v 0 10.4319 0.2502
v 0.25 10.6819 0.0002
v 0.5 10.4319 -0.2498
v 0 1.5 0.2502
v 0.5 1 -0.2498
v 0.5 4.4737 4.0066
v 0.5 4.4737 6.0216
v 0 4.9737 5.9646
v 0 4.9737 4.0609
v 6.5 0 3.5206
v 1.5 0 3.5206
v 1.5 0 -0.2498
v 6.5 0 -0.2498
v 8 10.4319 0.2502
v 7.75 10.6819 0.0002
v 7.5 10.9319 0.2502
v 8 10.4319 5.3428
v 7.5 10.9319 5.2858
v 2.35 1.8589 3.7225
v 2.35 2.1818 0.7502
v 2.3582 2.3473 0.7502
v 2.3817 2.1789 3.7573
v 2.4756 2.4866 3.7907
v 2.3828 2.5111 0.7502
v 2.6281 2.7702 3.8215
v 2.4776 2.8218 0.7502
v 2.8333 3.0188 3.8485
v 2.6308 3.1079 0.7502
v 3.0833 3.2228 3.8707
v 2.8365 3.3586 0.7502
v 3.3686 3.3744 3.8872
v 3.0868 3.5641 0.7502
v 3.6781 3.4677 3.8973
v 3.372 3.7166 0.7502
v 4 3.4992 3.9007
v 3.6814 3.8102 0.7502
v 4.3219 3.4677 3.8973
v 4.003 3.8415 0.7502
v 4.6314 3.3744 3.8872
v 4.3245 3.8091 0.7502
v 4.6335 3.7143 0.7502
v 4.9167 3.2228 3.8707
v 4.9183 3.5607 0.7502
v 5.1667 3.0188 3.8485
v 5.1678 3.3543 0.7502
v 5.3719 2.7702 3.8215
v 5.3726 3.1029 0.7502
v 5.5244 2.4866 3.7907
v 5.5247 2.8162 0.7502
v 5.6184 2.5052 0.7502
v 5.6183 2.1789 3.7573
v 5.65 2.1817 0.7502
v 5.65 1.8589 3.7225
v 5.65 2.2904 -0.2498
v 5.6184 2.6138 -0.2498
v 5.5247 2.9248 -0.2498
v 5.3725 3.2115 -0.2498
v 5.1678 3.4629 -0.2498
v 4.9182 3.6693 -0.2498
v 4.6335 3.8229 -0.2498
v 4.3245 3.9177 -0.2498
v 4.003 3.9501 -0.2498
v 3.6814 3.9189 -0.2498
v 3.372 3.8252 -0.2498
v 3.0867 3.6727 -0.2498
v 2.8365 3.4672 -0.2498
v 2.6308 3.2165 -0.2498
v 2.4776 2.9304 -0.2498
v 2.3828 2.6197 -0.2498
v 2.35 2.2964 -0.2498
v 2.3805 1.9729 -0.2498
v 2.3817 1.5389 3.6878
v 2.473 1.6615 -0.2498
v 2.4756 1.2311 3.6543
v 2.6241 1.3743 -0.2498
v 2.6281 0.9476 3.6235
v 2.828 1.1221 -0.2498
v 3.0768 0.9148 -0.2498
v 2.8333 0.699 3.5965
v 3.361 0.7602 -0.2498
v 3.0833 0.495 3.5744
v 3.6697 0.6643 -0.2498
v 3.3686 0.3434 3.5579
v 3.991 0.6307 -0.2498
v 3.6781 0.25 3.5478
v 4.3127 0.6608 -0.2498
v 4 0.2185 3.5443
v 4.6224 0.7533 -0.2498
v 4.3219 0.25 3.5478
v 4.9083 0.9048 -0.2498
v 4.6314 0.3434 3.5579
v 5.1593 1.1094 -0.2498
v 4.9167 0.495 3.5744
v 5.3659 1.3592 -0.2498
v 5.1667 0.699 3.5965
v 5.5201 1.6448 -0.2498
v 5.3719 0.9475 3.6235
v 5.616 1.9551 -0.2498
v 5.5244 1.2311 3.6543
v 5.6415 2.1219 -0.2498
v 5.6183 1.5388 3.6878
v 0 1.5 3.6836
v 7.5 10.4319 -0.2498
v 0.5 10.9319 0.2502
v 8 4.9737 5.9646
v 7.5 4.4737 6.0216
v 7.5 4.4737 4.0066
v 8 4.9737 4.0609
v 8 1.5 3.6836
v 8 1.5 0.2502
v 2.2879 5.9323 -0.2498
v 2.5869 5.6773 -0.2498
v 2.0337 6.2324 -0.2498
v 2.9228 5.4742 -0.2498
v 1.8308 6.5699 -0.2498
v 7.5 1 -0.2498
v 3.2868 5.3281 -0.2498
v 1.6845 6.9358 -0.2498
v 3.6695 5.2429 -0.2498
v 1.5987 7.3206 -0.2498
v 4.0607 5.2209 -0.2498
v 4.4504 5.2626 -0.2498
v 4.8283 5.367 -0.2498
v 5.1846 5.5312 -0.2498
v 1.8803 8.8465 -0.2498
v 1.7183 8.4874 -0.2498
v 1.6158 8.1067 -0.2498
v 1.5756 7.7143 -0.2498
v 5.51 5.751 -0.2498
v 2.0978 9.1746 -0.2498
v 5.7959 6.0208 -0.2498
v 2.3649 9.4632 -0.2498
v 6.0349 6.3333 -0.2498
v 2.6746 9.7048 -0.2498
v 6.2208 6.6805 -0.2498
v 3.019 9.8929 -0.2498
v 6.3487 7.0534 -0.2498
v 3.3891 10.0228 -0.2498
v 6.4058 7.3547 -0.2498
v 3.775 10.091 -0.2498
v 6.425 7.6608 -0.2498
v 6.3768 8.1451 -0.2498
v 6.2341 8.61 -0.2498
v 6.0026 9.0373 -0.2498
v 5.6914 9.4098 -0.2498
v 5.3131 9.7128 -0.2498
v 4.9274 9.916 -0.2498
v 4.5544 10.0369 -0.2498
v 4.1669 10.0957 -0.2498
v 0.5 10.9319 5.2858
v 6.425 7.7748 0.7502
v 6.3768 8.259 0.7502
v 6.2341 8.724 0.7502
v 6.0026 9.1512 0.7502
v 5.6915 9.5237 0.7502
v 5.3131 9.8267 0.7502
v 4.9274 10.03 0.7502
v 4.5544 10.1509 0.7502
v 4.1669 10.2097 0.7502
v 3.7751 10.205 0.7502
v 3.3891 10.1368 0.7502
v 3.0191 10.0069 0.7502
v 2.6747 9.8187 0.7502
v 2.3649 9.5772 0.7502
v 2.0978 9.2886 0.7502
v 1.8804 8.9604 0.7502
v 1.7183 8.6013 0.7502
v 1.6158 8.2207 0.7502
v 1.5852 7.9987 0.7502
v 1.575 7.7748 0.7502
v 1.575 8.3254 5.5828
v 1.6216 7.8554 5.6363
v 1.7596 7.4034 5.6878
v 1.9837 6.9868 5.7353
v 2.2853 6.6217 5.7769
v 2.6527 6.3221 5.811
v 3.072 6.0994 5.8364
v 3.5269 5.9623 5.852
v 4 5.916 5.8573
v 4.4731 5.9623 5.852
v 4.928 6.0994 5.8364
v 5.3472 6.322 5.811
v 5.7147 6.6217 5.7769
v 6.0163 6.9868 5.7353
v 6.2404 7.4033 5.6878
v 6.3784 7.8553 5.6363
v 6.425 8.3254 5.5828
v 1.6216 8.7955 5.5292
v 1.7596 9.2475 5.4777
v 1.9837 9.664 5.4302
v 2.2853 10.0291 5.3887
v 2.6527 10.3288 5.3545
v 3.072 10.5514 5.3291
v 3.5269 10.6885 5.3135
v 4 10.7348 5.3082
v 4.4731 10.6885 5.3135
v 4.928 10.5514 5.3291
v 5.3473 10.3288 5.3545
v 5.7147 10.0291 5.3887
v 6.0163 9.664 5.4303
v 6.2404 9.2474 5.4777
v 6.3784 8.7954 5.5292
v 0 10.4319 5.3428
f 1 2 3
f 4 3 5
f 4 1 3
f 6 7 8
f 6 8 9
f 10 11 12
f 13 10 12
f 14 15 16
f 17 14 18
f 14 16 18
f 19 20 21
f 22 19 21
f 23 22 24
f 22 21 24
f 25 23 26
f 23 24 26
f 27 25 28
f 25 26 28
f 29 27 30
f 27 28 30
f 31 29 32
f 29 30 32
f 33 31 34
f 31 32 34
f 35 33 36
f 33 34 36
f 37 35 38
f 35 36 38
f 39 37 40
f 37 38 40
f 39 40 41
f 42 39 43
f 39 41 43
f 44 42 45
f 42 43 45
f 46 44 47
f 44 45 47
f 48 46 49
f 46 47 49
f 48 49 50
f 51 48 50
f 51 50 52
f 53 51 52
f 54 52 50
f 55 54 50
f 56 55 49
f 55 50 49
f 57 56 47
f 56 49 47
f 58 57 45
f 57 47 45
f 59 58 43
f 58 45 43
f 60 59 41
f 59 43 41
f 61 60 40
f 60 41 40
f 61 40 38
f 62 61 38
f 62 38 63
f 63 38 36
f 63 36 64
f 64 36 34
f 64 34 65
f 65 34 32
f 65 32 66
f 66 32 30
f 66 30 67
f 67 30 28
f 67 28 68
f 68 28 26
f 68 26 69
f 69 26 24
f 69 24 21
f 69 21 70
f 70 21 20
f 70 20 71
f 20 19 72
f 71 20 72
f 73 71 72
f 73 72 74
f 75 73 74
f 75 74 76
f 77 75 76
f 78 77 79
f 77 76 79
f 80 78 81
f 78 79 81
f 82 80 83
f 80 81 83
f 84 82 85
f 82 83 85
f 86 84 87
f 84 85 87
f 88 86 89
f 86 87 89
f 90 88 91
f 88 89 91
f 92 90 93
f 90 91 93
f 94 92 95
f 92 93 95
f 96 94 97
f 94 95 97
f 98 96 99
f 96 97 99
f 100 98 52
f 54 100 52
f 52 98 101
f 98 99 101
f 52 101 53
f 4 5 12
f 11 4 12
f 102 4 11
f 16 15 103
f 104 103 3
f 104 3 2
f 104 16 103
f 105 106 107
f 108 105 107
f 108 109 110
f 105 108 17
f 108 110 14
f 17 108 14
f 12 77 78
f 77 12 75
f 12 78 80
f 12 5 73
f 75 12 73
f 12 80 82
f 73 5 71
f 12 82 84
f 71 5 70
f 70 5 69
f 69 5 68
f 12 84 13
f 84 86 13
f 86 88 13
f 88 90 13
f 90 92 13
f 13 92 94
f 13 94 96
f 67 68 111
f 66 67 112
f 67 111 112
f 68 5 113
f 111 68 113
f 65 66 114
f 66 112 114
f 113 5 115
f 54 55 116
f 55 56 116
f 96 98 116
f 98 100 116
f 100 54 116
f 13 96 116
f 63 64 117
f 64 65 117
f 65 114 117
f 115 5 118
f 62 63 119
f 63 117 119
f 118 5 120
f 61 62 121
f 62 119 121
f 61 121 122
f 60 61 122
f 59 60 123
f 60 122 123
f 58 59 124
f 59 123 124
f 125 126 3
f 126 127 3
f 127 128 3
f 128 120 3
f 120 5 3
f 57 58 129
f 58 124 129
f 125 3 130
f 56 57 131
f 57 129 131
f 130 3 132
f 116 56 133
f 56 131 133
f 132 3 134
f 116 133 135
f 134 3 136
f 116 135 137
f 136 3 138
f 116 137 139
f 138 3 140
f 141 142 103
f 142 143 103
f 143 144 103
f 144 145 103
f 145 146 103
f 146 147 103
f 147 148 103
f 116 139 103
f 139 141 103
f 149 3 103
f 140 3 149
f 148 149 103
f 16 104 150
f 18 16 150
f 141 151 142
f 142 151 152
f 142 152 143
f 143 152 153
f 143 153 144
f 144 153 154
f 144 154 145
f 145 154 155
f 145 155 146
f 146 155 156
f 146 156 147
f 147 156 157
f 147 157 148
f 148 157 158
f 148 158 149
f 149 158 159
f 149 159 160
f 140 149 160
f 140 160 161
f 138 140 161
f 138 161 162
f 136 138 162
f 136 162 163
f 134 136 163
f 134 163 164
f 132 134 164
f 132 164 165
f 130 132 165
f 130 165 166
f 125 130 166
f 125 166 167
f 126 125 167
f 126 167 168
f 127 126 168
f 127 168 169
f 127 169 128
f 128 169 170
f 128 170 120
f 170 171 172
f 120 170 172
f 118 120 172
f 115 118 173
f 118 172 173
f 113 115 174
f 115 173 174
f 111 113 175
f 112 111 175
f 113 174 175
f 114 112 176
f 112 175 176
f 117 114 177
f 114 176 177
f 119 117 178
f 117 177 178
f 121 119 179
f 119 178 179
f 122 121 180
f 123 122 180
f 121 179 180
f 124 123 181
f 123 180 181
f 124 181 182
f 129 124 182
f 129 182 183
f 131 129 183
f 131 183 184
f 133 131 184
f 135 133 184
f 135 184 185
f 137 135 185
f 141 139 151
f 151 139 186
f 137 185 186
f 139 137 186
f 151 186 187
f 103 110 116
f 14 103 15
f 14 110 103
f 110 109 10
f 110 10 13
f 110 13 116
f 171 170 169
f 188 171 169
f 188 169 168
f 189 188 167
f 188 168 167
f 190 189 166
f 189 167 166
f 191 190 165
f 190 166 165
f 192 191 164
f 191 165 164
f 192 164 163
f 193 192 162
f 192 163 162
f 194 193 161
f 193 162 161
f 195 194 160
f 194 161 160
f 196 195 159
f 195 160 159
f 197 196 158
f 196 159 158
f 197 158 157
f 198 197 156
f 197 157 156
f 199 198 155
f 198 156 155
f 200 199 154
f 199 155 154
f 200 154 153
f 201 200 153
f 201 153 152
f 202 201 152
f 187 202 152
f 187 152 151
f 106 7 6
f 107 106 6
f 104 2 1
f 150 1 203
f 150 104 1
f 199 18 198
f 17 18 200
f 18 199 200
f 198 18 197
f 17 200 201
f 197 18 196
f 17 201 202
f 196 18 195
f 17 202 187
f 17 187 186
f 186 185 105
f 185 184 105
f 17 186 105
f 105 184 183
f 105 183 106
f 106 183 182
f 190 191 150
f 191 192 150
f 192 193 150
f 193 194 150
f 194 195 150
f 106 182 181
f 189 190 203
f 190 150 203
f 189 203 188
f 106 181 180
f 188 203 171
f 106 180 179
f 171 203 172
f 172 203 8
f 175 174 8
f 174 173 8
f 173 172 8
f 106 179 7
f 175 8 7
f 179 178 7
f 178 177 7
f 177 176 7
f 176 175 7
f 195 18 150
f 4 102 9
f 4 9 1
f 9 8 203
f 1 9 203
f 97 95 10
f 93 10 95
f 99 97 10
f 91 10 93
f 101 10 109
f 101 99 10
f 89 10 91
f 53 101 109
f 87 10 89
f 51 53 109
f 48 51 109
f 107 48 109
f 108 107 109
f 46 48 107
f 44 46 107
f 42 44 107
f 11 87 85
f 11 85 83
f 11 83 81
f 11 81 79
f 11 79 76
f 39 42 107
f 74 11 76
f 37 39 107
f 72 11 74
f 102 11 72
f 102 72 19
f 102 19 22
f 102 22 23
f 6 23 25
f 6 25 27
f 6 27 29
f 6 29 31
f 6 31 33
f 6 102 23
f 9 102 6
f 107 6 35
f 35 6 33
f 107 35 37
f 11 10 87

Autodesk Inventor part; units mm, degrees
ref_plane "YZ Plane" through (0, 0, 0) normal (1, 0, 0) x (0, 1, 0)
ref_plane "XZ Plane" through (0, 0, 0) normal (0, 1, 0) x (-1, 0, 0)
ref_plane "XY Plane" through (0, 0, 0) normal (0, 0, 1) x (1, 0, 0)
sketch "Skizze5" plane through (0, 0, 0) normal (1, 0, 0) x (0, 1, 0)
  line L0 (0, 0) -> (0, 0)
  line L1 (0, 0) -> (4.4737, 0.486)
  line L2 (4.4737, 0.486) -> (10.9319, -0.2498)
  line L3 (10.9319, -0.2498) -> (10.9319, -0.2498)
  line L4 (10.9319, -0.2498) -> (10.9319, 5.2858)
  line L5 (10.9319, 5.2858) -> (4.4737, 6.0216)
  line L6 (0, 3.5206) -> (0, 0)
  line L7 (0, 3.5206) -> (4.4737, 4.0066)
  line L8 (4.4737, 8.0188) -> (4.4737, 2.9641) construction
  line L9 (4.4737, 6.0216) -> (4.4737, 4.0066)
  dimension "d21" = 0
  dimension "d22" = 6.2
  dimension "d23" = 6.5
  dimension "d24" = 4.5
  dimension "d25" = 6.5
  dimension "d26" = 5.5
  dimension "d27" = 3.5
extrude "Extrusion3" add sketch "Skizze5" along normal blind 8
sketch "Skizze6" plane through (8, 10.9319, -0.2498) normal (0, -0.1132, -0.9936) x (-1, 0, 0)
  circle A0 centre (4, -3.25) radius 2.425
  line L0 (4, 0.2781) -> (4, -10.3498)
  line L1 (-1.6335, -3.25) -> (9.1615, -3.25)
  line L2 (8, -6.5) -> (8, 0) projected
  line L3 (8, 0) -> (0, 0) projected
  point P0 (8, -10.8899)
  point P1 (8, -1.2477)
  point P2 (4, -0.9743)
  point P3 (8, -3.25)
  point P4 (4, 0)
  dimension "d30" = 4.85
extrude "Extrusion4" cut sketch "Skizze6" against normal through all contours L1 L0 A0 | A0 L0 L1 | L0 L1 A0 | A0 L1 L0
sketch "Skizze7" plane through (8, 4.4737, 0.486) normal (0, 0.108, -0.9942) x (-1, 0, 0)
  line L0 (-0.5646, -2.25) -> (9.8389, -2.25)
  line L1 (4, -0.832) -> (4, -8.1647)
  circle A0 centre (4, -2.25) radius 1.65
  line L2 (8, -4.5) -> (8, 0) projected
  line L3 (8, -4.5) -> (0, -4.5) projected
  point P0 (4, -5.6763)
  point P1 (8, -2.25)
  point P2 (8, -2.25)
  point P3 (4, -4.5)
  dimension "d33" = 3.3
extrude "Extrusion5" cut sketch "Skizze7" against normal through all contours A0 L0 | L0 L1 A0 | L0 A0 L1
chamfer "Fase2" distance 0.5 angle 45 4 edges at (8, 10.9319, 2.518) (0, 10.9319, 2.518) (8, 4.4737, 5.0141) (0, 4.4737, 5.0141)
ref_plane "Arbeitsebene3" through (0, 10.9319, -0.2498) normal (0, 0, 1) x (1, 0, 0)
sketch "Skizze11" plane through (0, 10.9319, -0.2498) normal (0, 0, 1) x (1, 0, 0)
  line L0 (0.5, 0) -> (7.5, 0) projected
  line L1 (8, -0.5) -> (7.5, 0) projected
  line L2 (8, -6.4582) -> (8, -0.5) projected
  line L3 (8, -10.9319) -> (8, -6.4582) projected
  line L4 (0, -10.9319) -> (8, -10.9319) projected
  line L5 (0, -10.9319) -> (0, -6.4582) projected
  line L6 (0, -6.4582) -> (0, -0.5) projected
  line L7 (0.5, 0) -> (0, -0.5) projected
extrude "Extrusion9" add sketch "Skizze11" along normal blind 1
sketch "Skizze12" plane through (0.5, 4.4737, 6.0216) normal (0, 0.1132, 0.9936) x (1, 0, 0)
  circle A0 centre (3.5, 3.8766) radius 2.425 projected
  point P0 (-0.5, -3.7633)
extrude "Extrusion10" cut sketch "Skizze12" against normal through all
sketch "Skizze13" plane through (0, 0, 3.5206) normal (0, -0.108, 0.9942) x (1, 0, 0)
  circle A0 centre (4, 1.8698) radius 1.65 projected
  point P0 (0, -0.3802)
extrude "Extrusion11" cut sketch "Skizze13" against normal through all
chamfer "Fase4" distance 0.5 angle 45 3 edges at (8, 5.2159, -0.2498) (4, 10.9319, -0.2498) (0, 5.2159, -0.2498)
chamfer "Fase5" distance 1.5 angle 45 2 edges at (8, 0, 1.8854) (0, 0, 1.8854)
properties part number "led_holder_v13"
